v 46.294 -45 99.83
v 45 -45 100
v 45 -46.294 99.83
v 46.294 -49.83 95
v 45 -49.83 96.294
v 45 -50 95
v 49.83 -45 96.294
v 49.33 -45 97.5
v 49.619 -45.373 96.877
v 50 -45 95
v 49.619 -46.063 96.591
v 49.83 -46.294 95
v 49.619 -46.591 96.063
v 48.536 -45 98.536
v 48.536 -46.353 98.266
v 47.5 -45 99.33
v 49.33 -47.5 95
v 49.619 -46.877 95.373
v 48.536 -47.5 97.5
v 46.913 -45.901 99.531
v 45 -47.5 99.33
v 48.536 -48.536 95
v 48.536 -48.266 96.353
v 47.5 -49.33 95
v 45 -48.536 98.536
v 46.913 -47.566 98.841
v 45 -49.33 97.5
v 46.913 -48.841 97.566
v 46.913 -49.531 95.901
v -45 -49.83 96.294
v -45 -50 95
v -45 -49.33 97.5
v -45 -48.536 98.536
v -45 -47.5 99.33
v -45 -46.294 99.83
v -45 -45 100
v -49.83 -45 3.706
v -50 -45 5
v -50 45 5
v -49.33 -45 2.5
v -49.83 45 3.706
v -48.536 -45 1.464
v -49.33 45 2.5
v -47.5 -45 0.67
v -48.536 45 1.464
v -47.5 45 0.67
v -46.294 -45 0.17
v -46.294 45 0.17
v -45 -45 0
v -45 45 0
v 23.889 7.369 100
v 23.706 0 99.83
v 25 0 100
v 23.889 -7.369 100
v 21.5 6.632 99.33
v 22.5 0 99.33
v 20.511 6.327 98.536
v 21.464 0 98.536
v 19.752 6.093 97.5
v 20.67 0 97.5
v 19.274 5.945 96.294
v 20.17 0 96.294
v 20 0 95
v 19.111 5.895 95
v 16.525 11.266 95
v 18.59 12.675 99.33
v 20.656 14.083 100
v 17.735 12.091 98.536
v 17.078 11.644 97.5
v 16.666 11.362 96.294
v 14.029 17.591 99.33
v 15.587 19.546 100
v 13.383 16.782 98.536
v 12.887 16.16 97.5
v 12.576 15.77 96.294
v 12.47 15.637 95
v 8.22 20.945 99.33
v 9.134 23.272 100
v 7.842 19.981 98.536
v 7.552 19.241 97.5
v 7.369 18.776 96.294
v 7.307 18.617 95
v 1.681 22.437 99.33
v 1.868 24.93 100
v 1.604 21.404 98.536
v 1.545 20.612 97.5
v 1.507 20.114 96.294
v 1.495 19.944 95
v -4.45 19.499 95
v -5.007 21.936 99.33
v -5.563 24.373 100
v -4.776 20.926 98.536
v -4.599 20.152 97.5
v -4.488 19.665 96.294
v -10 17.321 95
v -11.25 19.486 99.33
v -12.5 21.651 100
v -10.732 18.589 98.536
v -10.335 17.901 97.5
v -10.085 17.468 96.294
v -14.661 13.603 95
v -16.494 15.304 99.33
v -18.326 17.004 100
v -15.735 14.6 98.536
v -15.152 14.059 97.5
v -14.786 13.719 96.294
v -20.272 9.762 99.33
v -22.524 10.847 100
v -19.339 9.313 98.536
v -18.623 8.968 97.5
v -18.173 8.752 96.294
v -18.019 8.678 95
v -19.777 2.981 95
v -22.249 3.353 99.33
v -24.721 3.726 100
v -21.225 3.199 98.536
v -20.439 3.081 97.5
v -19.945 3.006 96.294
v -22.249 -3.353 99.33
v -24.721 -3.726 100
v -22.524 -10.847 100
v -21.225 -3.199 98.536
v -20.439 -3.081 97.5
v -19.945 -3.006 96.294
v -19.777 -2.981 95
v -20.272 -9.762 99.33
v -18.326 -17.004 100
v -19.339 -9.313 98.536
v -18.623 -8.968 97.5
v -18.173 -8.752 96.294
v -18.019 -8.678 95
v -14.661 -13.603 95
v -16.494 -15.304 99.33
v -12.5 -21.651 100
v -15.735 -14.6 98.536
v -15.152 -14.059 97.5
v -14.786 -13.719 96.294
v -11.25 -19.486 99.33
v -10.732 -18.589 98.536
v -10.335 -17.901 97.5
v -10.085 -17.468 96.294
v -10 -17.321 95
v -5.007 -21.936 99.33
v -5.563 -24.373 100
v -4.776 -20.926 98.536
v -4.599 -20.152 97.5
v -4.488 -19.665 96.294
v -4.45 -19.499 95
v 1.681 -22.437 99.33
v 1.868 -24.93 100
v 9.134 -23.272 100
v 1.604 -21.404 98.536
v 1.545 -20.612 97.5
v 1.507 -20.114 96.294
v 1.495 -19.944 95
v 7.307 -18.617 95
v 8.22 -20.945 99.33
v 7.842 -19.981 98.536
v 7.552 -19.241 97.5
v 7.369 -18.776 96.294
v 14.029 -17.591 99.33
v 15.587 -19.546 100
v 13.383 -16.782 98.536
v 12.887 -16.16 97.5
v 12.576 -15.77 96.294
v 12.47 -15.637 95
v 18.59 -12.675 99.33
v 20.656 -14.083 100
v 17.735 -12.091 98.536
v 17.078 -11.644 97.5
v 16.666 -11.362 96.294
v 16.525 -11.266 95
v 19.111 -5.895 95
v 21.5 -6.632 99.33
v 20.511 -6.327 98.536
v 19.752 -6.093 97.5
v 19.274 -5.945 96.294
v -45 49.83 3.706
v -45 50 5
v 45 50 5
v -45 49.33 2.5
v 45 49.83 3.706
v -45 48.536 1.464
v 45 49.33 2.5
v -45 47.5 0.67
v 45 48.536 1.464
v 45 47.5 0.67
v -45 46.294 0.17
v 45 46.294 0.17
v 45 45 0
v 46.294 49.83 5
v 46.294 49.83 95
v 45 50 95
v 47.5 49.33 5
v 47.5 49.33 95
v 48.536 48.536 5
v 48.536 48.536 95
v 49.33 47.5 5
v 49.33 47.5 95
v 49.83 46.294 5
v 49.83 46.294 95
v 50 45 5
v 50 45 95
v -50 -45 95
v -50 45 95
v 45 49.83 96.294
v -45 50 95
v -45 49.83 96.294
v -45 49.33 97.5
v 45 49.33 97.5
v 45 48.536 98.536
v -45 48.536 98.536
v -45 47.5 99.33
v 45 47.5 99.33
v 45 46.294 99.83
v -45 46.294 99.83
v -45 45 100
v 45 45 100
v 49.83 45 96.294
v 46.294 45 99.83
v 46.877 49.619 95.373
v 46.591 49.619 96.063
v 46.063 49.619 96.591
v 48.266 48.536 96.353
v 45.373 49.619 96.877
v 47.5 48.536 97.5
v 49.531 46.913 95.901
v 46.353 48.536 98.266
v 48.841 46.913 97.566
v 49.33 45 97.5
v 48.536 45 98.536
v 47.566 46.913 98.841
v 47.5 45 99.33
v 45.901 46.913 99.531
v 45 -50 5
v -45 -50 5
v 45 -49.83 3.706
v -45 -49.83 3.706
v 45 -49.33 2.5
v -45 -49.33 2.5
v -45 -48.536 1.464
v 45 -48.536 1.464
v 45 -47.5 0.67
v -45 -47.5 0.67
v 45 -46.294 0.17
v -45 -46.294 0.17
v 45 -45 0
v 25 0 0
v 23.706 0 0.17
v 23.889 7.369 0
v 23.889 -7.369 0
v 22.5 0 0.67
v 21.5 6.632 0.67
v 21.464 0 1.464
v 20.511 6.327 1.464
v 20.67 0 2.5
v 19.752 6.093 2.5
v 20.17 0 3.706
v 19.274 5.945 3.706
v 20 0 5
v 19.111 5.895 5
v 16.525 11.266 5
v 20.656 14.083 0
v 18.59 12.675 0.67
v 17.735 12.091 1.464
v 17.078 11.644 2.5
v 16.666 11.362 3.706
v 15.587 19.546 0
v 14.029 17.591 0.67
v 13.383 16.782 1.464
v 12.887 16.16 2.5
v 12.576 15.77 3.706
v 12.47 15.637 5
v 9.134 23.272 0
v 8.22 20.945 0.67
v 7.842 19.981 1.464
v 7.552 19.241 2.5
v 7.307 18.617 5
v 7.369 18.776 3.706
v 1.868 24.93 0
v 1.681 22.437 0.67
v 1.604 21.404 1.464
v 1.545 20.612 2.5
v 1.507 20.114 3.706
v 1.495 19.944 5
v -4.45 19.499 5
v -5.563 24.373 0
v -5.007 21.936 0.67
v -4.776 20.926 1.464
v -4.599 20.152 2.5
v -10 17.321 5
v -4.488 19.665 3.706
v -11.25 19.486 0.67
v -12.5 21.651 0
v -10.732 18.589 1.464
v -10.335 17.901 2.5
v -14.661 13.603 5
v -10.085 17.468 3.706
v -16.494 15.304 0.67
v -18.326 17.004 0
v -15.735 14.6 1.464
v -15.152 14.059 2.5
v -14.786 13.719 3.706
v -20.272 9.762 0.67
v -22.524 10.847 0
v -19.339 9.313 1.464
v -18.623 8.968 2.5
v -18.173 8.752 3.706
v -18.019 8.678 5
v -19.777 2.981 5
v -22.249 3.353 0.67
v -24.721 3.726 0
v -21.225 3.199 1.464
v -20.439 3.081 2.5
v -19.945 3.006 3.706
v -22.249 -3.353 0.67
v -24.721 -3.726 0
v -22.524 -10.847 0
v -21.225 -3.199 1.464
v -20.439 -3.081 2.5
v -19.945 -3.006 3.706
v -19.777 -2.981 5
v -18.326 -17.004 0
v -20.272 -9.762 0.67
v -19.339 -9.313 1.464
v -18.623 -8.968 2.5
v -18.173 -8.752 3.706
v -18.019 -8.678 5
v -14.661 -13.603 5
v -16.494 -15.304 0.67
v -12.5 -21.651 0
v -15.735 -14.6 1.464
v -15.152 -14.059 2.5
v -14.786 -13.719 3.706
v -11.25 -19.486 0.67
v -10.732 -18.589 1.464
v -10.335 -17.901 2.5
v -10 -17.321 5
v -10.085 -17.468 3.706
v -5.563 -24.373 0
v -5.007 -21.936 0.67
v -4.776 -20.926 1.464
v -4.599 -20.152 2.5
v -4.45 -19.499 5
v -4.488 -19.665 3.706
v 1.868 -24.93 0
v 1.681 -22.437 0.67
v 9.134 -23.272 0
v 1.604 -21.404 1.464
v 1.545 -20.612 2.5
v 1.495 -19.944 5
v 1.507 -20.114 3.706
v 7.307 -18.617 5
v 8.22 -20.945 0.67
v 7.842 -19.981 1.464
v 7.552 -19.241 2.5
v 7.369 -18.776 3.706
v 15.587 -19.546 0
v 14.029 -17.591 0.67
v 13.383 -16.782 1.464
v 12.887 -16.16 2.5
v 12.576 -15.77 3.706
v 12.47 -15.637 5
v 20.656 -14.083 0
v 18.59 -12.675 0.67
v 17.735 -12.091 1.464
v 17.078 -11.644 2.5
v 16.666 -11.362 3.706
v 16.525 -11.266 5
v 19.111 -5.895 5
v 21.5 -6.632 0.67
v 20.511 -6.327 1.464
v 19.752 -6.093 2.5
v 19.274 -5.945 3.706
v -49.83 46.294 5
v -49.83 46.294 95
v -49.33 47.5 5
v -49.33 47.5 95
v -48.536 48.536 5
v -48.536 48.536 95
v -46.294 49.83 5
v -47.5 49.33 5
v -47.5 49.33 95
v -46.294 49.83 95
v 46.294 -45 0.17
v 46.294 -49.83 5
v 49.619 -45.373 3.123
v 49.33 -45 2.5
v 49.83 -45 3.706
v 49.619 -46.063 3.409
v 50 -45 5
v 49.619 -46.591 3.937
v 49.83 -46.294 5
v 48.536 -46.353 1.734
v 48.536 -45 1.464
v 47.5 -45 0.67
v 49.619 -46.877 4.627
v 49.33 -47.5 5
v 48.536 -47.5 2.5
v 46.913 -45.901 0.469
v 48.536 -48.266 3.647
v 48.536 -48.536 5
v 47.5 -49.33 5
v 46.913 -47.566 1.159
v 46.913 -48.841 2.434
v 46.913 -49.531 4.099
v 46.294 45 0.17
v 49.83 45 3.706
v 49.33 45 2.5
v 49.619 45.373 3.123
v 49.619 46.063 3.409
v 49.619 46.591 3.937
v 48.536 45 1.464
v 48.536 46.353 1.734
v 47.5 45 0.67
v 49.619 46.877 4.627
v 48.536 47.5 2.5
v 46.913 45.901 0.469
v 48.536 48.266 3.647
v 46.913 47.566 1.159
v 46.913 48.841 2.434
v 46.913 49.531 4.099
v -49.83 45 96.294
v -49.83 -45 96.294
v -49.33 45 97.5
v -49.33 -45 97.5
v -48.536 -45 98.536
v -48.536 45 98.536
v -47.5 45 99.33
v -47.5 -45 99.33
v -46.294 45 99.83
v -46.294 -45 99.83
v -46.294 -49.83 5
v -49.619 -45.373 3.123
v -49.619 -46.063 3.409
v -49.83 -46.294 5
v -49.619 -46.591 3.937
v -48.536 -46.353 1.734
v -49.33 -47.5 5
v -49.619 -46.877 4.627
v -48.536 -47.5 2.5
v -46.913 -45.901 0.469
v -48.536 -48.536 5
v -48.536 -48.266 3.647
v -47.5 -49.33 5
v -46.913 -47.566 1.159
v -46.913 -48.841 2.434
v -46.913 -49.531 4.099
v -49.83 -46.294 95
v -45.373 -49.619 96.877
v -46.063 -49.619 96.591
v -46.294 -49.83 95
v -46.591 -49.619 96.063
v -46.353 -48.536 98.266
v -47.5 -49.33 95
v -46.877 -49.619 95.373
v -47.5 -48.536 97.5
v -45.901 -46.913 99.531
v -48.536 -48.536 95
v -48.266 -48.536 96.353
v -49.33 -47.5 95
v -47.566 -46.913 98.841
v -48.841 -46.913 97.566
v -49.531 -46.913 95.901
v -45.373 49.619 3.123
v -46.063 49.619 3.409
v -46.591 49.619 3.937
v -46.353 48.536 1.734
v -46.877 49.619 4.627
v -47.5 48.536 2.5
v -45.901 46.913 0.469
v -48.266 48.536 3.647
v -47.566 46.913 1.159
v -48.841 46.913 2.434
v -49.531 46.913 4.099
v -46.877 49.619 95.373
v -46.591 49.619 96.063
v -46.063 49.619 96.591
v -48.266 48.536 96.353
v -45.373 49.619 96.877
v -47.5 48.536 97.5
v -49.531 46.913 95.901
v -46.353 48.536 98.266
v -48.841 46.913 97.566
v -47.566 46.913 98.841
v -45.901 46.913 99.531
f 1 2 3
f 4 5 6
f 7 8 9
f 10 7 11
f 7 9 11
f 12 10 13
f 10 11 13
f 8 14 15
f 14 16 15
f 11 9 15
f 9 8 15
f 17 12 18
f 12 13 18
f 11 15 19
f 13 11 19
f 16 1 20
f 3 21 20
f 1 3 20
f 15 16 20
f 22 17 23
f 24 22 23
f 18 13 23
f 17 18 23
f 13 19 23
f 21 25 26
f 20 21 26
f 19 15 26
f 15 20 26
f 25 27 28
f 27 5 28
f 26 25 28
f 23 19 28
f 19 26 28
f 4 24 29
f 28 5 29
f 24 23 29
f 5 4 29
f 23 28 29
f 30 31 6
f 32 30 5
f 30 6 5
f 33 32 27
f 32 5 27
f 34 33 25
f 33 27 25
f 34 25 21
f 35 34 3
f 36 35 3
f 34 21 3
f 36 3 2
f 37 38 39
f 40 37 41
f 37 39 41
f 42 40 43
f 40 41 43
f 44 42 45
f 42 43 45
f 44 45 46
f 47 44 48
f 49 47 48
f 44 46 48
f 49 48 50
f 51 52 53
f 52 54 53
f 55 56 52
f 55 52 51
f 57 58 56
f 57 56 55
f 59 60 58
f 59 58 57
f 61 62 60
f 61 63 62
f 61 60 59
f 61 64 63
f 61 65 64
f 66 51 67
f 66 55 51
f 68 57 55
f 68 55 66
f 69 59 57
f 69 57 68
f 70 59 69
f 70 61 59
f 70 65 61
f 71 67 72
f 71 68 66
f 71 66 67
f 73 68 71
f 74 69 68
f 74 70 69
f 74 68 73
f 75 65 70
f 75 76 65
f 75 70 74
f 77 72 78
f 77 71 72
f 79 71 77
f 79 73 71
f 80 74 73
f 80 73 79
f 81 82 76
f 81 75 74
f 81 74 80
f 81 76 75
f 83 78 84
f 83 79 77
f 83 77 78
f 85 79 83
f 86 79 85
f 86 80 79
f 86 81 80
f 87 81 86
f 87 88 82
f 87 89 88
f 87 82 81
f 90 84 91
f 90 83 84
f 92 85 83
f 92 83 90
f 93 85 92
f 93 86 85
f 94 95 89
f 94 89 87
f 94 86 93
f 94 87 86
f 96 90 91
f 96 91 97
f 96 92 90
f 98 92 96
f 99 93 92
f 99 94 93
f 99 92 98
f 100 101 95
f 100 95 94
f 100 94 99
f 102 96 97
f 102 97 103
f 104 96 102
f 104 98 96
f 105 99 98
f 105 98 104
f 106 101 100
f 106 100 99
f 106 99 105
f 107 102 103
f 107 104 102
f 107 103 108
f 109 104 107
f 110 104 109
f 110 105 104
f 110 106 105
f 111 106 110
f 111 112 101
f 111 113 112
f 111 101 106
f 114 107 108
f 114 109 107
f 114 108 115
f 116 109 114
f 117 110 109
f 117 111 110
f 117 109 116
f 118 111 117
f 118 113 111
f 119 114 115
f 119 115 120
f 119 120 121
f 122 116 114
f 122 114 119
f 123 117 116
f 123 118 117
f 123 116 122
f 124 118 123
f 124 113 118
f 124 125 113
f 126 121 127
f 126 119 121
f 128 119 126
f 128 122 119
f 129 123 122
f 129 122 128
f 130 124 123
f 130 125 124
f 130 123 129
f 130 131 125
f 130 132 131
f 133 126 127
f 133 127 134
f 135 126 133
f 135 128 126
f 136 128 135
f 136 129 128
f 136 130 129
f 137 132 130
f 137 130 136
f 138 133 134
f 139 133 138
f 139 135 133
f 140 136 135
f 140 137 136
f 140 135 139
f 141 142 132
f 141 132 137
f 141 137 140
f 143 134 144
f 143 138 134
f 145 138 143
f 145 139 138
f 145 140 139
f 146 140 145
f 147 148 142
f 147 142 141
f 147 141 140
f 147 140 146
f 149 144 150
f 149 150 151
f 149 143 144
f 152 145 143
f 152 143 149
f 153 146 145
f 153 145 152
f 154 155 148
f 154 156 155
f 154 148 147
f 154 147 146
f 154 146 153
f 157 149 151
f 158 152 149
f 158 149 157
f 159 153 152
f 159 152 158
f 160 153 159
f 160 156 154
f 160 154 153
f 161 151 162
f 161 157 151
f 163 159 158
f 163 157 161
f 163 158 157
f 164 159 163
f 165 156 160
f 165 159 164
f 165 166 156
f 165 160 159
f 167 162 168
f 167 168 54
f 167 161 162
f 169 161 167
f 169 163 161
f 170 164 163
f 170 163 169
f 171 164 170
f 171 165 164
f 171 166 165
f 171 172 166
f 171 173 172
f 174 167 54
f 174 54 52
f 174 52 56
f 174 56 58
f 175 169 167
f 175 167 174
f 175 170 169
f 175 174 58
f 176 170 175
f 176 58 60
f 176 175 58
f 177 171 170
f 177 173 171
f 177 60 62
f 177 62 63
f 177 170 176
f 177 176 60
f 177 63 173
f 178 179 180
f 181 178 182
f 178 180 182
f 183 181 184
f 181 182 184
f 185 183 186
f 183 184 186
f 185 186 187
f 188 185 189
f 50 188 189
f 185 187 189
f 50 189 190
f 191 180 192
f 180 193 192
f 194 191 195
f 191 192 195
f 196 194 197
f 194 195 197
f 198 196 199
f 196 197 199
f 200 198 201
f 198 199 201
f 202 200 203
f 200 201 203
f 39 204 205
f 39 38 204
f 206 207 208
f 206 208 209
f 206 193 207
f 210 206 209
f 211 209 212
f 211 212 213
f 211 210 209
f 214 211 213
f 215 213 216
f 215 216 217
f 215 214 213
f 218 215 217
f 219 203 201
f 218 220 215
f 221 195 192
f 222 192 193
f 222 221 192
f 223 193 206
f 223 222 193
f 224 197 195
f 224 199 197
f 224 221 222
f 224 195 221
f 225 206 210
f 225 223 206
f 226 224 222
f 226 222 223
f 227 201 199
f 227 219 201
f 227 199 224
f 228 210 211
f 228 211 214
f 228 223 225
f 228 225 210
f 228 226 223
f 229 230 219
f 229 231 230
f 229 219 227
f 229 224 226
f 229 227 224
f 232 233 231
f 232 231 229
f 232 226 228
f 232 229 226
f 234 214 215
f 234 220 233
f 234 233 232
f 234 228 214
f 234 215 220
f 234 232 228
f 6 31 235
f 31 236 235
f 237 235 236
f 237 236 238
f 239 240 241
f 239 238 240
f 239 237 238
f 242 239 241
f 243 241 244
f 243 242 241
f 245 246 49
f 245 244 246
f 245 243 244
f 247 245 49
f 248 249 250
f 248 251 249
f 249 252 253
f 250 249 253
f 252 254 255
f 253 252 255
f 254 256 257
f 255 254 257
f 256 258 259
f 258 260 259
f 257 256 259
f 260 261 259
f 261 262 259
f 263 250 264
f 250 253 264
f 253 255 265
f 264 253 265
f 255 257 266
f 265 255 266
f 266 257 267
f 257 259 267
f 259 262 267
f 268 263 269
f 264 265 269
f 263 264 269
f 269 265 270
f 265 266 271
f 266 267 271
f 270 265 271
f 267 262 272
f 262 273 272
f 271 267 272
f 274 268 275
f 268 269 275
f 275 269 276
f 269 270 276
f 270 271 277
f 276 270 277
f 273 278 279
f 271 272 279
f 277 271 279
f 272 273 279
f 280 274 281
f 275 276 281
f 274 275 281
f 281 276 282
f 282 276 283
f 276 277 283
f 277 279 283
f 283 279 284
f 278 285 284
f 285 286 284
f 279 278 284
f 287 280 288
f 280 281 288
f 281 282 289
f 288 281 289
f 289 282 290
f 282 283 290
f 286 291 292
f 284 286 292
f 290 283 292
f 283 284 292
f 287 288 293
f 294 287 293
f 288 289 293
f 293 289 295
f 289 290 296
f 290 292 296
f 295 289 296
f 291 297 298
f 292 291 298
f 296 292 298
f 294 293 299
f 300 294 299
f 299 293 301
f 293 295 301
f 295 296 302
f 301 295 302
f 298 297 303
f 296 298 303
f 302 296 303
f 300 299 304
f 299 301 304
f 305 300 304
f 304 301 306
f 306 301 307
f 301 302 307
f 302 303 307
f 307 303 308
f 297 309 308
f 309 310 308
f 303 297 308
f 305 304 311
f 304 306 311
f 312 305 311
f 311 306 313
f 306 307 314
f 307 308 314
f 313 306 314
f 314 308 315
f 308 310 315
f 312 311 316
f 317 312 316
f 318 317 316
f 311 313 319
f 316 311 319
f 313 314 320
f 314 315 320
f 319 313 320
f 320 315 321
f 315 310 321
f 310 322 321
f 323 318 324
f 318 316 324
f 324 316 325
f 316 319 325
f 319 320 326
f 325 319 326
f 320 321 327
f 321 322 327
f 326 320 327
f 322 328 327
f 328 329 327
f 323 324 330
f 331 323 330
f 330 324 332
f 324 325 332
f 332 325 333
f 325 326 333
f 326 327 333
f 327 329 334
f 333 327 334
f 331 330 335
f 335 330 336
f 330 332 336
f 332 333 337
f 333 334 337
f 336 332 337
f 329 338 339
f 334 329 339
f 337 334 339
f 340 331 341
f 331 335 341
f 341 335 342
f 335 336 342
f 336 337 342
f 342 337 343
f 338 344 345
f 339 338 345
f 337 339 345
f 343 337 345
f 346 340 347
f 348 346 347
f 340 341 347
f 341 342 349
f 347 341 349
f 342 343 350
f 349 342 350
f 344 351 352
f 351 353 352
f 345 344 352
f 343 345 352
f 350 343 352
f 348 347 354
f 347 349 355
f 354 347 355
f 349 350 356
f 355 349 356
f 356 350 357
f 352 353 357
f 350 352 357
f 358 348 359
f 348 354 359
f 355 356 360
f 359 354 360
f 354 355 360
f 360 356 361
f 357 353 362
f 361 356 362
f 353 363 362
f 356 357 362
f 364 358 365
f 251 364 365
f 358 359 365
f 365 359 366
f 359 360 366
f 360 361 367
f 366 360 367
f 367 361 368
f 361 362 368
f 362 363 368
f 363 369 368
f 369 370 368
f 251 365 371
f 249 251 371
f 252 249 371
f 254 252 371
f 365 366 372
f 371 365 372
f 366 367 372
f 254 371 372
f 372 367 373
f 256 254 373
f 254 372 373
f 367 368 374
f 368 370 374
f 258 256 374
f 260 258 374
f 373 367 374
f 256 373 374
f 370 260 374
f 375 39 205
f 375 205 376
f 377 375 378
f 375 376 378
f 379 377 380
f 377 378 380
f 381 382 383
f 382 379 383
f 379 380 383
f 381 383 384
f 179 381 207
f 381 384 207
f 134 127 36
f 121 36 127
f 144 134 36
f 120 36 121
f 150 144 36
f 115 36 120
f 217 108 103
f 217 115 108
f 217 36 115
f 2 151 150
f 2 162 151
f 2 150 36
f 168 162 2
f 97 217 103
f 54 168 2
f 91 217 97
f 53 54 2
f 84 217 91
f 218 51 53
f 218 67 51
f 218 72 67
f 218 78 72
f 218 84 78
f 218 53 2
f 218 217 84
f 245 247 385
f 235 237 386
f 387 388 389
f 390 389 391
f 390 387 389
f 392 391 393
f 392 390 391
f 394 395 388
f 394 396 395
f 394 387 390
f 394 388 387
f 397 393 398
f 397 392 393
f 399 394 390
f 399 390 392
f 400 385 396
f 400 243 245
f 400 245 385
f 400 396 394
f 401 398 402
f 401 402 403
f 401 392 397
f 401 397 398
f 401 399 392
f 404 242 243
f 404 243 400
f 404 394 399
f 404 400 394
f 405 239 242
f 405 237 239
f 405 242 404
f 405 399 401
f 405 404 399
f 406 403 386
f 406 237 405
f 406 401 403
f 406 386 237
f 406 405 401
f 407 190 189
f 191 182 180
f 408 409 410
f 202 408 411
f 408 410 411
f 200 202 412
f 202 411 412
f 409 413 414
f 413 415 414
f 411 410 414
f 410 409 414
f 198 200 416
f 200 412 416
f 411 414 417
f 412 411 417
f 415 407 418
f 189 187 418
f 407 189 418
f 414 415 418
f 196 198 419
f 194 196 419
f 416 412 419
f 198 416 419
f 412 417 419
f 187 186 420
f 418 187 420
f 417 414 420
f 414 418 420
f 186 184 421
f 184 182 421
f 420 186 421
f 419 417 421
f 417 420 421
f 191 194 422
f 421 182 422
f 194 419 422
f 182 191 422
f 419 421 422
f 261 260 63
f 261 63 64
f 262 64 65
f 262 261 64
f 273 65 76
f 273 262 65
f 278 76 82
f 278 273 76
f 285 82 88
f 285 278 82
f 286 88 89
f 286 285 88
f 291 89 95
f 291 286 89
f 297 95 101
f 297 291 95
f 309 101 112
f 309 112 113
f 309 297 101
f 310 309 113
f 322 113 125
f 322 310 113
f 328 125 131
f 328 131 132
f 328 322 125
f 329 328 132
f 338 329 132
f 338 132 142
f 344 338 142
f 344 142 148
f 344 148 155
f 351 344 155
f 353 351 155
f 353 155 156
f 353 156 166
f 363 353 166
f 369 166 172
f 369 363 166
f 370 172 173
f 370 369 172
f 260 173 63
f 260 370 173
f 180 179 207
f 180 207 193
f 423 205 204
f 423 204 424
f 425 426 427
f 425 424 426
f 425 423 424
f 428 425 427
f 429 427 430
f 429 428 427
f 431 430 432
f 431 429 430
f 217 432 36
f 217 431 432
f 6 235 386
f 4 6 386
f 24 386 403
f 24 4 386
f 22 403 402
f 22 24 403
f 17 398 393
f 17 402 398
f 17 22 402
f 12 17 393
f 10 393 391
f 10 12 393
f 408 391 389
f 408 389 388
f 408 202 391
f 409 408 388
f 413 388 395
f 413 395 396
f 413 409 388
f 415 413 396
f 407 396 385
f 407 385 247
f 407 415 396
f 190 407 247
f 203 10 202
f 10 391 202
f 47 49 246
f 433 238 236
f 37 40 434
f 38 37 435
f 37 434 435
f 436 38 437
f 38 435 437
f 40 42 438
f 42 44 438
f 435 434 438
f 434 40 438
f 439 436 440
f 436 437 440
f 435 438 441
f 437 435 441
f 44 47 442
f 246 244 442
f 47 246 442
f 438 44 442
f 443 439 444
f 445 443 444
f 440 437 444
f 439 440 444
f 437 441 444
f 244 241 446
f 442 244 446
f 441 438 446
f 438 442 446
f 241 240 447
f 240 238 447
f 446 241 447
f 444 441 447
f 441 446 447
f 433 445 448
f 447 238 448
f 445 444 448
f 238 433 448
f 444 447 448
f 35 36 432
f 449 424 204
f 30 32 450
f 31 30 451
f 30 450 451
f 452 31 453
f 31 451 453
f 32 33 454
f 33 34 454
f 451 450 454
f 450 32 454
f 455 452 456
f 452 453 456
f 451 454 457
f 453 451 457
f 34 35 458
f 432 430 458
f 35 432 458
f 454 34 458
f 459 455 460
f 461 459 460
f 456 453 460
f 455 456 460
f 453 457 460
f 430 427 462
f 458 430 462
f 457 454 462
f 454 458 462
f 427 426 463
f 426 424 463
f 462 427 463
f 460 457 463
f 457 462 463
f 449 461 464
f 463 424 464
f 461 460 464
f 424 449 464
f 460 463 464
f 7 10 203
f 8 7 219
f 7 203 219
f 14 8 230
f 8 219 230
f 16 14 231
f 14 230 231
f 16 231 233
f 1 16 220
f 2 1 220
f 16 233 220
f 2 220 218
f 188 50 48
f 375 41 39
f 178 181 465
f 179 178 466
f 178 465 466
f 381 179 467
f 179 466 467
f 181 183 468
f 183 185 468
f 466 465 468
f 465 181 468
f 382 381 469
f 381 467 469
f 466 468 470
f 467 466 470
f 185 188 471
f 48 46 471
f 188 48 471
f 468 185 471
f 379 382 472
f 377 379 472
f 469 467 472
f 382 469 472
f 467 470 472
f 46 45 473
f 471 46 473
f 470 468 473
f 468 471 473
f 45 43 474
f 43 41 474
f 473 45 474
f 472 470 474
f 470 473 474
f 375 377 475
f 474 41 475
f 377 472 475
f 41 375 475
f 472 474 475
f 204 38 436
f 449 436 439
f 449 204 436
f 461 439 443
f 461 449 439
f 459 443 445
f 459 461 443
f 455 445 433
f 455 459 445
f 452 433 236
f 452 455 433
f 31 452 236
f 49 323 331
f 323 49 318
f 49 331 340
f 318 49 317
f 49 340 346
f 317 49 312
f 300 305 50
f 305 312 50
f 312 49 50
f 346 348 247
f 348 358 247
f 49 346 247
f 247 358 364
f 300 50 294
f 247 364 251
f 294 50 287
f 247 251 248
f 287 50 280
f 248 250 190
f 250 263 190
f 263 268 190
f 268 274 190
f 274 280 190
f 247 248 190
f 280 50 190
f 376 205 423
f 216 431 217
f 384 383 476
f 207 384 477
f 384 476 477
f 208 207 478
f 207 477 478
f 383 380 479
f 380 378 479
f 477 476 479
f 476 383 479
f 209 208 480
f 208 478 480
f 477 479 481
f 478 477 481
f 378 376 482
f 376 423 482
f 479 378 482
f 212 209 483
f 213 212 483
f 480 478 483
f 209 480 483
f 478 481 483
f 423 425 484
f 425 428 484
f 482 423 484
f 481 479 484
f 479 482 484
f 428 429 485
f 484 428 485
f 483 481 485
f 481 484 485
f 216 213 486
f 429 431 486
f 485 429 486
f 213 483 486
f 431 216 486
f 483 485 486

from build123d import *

# Parameters (mm, degrees)
SKETCH_1_W      = 100
SKETCH_1_H      = 100
SKETCH_1_R      = 20
EXTRUDE_1_DEPTH = 100
FILLET_1_R      = 5
FILLET_2_R      = 5


with BuildPart() as part:
    # 草图1 → 凸台-拉伸1 (new body)
    with BuildSketch(Plane.XY):
        Rectangle(SKETCH_1_W, SKETCH_1_H)
        Circle(SKETCH_1_R, mode=Mode.SUBTRACT)
    extrude(amount=EXTRUDE_1_DEPTH)

    # 圆角1
    fillet_1_edges = [part.edges().sort_by_distance(p)[0] for p in [
        (-50, 0, 100),
        (0, -50, 100),
        (50, 0, 100),
        (0, -50, 0),
        (-50, 0, 0),
        (0, 50, 0),
        (50, 0, 0),
        (50, -50, 50),
        (-50, -50, 50),
        (-50, 50, 50),
        (50, 50, 50),
        (0, 50, 100),
    ]]
    fillet(fillet_1_edges, radius=FILLET_1_R)

    # 圆角2
    fillet_2_edges = [part.edges().sort_by_distance(p)[0] for p in [
        (-20, 0, 0),
        (-20, 0, 100),
    ]]
    fillet(fillet_2_edges, radius=FILLET_2_R)


solid = part.part
